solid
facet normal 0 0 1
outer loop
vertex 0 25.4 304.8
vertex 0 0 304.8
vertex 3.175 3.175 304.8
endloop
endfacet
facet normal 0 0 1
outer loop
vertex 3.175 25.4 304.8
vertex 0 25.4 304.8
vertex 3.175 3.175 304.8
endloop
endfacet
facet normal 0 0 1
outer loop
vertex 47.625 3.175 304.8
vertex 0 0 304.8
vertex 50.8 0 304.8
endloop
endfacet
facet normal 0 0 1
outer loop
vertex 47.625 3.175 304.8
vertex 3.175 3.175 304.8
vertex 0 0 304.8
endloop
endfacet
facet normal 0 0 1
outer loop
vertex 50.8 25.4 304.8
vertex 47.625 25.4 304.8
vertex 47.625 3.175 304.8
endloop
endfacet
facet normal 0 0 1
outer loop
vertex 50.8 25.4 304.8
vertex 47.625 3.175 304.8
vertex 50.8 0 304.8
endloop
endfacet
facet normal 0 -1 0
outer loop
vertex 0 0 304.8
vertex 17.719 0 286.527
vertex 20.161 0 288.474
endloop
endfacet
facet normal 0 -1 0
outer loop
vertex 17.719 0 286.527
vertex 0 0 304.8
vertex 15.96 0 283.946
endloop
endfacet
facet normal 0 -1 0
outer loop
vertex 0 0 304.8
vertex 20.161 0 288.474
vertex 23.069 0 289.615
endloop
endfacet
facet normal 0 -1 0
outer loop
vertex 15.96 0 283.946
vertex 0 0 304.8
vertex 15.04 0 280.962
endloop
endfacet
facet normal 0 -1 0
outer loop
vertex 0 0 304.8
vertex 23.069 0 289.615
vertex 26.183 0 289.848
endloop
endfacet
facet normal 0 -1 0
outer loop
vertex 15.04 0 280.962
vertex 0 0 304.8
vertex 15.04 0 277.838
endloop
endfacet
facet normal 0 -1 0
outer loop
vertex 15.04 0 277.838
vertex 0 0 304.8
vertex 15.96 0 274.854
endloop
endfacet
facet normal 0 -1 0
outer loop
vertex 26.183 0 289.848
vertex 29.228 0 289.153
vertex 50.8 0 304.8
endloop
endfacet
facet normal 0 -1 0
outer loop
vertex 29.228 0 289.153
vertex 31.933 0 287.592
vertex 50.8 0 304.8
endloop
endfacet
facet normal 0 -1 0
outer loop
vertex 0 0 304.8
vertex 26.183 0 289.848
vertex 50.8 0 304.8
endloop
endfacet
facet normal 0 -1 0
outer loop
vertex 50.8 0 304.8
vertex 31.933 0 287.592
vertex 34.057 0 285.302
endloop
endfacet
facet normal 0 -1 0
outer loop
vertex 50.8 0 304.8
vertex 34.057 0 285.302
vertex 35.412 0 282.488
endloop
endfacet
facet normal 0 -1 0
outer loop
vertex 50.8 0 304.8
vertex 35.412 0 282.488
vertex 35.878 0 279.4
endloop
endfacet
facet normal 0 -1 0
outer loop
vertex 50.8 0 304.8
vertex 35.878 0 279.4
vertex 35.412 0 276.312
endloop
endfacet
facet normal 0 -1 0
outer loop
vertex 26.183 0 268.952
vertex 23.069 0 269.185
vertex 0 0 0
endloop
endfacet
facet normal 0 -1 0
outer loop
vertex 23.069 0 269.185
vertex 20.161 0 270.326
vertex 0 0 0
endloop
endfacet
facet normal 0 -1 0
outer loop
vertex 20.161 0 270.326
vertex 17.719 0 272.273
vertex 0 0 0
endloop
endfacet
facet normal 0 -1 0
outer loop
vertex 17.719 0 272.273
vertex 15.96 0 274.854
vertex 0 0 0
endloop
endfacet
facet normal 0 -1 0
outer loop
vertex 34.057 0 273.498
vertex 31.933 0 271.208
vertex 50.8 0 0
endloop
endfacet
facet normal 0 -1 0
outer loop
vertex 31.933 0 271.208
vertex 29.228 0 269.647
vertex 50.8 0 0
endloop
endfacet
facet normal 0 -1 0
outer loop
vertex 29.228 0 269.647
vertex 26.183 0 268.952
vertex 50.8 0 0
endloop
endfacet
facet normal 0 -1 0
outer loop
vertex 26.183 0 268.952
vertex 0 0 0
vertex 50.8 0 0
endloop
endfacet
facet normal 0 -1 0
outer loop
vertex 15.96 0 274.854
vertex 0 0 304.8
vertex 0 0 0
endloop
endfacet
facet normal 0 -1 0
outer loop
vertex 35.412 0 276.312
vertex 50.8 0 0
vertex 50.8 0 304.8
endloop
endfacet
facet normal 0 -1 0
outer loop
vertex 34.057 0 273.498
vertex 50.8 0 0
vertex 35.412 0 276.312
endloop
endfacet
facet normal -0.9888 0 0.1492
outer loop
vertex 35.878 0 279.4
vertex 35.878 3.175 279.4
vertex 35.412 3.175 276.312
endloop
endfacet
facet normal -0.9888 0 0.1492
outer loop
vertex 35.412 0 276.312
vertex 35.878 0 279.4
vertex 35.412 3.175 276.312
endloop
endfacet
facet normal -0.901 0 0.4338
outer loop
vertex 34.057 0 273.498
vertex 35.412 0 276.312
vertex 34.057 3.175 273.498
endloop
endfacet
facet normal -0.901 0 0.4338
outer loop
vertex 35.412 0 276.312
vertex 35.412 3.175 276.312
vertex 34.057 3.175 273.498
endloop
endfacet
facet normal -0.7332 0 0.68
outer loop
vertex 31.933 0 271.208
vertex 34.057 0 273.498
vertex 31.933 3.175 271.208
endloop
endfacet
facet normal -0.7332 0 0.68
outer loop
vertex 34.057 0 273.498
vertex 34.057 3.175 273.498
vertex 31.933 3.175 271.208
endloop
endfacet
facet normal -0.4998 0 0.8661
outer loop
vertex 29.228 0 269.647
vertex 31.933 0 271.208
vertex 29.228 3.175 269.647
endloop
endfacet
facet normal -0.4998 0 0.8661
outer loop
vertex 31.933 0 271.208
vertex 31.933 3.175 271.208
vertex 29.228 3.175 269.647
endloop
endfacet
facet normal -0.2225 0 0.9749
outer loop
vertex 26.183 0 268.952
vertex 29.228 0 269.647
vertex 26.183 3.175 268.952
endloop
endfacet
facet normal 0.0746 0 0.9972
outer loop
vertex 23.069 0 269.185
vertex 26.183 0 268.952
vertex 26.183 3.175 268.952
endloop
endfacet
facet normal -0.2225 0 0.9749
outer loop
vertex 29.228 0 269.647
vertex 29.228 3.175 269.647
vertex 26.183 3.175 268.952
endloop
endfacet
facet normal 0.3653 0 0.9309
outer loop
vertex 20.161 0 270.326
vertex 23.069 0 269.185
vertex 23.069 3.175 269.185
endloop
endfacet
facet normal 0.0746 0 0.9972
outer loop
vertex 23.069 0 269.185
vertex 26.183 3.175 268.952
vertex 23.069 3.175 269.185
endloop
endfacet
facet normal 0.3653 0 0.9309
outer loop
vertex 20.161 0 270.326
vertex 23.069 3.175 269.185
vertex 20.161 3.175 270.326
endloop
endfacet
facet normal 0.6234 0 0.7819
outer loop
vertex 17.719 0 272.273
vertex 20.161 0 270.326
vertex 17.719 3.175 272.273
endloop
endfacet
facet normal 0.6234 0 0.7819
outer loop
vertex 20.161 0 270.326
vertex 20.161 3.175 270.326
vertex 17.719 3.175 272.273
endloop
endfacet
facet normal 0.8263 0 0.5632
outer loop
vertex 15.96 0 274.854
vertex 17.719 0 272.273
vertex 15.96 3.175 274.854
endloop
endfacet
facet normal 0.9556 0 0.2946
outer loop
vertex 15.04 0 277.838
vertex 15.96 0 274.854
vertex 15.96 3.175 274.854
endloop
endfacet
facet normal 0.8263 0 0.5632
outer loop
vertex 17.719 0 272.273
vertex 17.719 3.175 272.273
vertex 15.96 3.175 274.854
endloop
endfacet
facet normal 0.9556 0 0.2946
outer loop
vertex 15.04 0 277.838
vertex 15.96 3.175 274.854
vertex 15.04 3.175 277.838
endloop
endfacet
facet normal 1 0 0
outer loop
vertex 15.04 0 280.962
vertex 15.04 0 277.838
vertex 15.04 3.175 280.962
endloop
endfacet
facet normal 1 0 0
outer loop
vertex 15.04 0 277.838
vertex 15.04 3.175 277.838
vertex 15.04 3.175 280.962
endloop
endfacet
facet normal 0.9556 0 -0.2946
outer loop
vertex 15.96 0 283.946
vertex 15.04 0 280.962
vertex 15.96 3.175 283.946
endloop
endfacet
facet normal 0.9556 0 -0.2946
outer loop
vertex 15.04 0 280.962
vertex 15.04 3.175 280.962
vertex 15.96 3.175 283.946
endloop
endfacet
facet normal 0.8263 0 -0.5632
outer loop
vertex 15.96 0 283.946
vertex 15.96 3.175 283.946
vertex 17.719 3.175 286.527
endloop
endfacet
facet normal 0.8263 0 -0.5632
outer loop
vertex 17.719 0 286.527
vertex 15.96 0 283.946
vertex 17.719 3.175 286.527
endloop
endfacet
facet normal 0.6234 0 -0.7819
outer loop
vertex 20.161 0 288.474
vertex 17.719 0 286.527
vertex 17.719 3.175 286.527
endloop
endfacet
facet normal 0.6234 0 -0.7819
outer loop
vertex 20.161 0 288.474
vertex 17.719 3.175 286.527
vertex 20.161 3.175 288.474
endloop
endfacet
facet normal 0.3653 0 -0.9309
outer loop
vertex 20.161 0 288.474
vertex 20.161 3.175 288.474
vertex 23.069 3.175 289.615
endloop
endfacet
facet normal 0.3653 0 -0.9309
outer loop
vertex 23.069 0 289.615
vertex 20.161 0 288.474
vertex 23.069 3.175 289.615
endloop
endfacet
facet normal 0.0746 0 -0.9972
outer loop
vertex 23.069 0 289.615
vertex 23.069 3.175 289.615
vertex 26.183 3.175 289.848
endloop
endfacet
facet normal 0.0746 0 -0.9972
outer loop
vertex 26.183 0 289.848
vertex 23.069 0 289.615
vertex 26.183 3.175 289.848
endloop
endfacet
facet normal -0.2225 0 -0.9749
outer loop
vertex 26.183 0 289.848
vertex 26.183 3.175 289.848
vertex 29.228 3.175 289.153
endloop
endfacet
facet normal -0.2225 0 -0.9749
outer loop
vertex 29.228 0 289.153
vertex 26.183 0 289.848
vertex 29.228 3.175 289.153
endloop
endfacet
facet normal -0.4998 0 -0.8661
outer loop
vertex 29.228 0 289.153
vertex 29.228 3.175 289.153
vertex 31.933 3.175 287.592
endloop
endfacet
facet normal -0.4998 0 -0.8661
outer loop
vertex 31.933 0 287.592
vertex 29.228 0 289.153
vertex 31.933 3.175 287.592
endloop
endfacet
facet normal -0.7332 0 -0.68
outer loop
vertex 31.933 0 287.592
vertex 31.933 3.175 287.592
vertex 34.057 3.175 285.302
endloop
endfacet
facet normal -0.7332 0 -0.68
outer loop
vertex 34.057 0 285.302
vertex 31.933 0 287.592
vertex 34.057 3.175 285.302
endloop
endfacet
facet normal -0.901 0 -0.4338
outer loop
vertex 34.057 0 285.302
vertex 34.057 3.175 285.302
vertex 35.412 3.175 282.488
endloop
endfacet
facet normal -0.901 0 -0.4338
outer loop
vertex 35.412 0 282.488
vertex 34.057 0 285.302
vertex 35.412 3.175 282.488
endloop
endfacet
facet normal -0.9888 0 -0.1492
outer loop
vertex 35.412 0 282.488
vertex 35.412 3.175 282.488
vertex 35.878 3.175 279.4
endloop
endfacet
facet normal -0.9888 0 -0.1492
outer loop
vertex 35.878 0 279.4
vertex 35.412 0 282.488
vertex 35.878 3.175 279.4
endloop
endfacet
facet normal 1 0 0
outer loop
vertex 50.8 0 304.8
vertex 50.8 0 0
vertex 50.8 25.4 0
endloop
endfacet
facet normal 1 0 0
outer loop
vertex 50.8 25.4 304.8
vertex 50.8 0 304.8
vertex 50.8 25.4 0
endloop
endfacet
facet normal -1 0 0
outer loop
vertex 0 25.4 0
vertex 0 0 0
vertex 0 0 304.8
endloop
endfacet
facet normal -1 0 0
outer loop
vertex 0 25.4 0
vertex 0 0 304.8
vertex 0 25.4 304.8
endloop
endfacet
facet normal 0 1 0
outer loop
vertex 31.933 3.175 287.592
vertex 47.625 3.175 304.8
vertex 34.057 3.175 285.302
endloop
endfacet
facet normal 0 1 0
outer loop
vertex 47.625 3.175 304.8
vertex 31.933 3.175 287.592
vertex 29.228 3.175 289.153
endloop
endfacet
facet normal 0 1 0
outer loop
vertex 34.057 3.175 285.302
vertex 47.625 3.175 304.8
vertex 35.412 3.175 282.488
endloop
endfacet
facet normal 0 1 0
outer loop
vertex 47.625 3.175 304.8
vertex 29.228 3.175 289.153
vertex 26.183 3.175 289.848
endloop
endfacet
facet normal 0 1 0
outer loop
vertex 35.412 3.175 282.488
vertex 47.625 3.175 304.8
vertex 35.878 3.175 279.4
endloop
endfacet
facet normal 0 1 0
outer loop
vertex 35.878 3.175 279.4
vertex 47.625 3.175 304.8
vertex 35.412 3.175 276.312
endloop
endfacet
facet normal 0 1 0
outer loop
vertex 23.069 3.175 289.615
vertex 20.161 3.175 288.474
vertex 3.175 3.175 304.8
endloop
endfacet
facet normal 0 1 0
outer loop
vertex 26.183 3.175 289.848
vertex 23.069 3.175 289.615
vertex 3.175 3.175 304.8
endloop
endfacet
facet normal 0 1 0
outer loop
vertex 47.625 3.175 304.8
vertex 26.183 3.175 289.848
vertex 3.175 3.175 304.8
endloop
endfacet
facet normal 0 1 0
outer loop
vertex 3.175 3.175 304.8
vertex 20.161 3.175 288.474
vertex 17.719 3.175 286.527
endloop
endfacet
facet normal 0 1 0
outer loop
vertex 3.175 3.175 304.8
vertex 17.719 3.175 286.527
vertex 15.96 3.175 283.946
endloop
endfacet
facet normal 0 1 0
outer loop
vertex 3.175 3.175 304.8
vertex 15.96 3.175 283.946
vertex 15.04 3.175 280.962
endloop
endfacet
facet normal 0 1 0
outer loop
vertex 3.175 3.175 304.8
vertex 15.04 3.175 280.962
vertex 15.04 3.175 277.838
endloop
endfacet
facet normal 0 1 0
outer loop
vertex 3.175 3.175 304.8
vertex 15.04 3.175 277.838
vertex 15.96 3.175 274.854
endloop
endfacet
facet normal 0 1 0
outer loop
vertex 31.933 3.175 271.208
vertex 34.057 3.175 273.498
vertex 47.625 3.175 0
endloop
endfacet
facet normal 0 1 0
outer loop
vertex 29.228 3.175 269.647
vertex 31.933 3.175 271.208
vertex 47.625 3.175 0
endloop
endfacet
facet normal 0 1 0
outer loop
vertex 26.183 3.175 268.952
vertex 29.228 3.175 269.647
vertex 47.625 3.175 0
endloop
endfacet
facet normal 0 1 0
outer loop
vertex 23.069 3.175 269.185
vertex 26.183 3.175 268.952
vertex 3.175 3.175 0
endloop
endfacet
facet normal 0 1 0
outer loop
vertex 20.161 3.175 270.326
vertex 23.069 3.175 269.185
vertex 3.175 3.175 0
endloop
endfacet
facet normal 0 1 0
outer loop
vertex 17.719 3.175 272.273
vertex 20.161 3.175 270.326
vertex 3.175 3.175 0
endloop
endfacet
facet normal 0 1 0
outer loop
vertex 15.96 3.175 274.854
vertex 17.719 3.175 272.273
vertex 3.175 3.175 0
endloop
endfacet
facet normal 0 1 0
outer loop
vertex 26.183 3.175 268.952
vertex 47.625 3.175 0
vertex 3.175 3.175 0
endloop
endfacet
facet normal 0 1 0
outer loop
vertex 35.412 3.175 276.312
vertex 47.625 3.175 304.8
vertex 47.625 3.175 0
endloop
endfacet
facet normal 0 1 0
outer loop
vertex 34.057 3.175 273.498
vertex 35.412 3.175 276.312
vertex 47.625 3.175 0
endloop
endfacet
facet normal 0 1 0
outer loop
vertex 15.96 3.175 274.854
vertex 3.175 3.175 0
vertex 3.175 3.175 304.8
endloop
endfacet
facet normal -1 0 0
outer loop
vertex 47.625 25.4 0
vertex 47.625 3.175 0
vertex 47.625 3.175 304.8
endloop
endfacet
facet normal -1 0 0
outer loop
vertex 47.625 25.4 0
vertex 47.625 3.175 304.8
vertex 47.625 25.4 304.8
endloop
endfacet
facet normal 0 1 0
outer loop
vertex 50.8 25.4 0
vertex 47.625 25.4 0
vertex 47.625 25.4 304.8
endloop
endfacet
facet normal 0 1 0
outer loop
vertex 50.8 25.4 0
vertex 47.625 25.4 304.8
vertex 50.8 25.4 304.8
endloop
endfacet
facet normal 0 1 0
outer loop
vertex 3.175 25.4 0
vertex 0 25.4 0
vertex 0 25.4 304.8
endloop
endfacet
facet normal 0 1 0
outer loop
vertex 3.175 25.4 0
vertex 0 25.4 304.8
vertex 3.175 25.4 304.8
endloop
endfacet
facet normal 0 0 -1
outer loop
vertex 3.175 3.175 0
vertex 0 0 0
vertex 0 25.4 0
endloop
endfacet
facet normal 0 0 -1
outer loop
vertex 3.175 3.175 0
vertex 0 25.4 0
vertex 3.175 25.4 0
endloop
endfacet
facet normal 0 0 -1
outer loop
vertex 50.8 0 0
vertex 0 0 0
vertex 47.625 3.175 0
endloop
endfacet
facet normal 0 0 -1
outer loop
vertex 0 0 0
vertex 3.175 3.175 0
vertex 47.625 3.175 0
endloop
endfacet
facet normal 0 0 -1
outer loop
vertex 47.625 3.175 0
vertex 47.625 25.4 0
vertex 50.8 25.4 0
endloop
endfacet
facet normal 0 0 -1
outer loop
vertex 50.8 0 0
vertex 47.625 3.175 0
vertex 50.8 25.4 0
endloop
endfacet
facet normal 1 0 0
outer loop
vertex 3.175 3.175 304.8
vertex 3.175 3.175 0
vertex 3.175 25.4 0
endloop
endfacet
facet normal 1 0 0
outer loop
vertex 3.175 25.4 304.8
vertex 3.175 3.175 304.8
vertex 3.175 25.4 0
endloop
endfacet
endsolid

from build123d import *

# Parameters (mm, degrees)
SKETCH1_W           = 50.8
SKETCH1_H           = 25.4
BOSS_EXTRUDE1_DEPTH = 304.8
SKETCH2_W           = 44.45
SKETCH2_H           = 22.225
CUT_EXTRUDE1_DEPTH  = 305.8
SKETCH3_R           = 10.4775
CUT_EXTRUDE2_DEPTH  = 4.175


with BuildPart() as part:
    # Sketch1 → Boss-Extrude1 (new body)
    with BuildSketch(Plane.XY):
        with Locations((25.4, 12.7)):
            Rectangle(SKETCH1_W, SKETCH1_H)
    extrude(amount=BOSS_EXTRUDE1_DEPTH)

    # Sketch2 → Cut-Extrude1 (cut, through all)
    with BuildSketch(Plane(origin=(0, 0, 0), x_dir=(-1, 0, 0), z_dir=(0, 0, -1))):
        with Locations((-25.4, 14.2875)):
            Rectangle(SKETCH2_W, SKETCH2_H)
    extrude(amount=-CUT_EXTRUDE1_DEPTH, mode=Mode.SUBTRACT)

    # Sketch3 → Cut-Extrude2 (cut, through all)
    with BuildSketch(Plane(origin=(0, 3.175, 0), x_dir=(1, 0, 0), z_dir=(0, 1, 0))):
        with Locations((25.4, -279.4)):
            Circle(SKETCH3_R)
    extrude(amount=-CUT_EXTRUDE2_DEPTH, mode=Mode.SUBTRACT)


solid = part.part
